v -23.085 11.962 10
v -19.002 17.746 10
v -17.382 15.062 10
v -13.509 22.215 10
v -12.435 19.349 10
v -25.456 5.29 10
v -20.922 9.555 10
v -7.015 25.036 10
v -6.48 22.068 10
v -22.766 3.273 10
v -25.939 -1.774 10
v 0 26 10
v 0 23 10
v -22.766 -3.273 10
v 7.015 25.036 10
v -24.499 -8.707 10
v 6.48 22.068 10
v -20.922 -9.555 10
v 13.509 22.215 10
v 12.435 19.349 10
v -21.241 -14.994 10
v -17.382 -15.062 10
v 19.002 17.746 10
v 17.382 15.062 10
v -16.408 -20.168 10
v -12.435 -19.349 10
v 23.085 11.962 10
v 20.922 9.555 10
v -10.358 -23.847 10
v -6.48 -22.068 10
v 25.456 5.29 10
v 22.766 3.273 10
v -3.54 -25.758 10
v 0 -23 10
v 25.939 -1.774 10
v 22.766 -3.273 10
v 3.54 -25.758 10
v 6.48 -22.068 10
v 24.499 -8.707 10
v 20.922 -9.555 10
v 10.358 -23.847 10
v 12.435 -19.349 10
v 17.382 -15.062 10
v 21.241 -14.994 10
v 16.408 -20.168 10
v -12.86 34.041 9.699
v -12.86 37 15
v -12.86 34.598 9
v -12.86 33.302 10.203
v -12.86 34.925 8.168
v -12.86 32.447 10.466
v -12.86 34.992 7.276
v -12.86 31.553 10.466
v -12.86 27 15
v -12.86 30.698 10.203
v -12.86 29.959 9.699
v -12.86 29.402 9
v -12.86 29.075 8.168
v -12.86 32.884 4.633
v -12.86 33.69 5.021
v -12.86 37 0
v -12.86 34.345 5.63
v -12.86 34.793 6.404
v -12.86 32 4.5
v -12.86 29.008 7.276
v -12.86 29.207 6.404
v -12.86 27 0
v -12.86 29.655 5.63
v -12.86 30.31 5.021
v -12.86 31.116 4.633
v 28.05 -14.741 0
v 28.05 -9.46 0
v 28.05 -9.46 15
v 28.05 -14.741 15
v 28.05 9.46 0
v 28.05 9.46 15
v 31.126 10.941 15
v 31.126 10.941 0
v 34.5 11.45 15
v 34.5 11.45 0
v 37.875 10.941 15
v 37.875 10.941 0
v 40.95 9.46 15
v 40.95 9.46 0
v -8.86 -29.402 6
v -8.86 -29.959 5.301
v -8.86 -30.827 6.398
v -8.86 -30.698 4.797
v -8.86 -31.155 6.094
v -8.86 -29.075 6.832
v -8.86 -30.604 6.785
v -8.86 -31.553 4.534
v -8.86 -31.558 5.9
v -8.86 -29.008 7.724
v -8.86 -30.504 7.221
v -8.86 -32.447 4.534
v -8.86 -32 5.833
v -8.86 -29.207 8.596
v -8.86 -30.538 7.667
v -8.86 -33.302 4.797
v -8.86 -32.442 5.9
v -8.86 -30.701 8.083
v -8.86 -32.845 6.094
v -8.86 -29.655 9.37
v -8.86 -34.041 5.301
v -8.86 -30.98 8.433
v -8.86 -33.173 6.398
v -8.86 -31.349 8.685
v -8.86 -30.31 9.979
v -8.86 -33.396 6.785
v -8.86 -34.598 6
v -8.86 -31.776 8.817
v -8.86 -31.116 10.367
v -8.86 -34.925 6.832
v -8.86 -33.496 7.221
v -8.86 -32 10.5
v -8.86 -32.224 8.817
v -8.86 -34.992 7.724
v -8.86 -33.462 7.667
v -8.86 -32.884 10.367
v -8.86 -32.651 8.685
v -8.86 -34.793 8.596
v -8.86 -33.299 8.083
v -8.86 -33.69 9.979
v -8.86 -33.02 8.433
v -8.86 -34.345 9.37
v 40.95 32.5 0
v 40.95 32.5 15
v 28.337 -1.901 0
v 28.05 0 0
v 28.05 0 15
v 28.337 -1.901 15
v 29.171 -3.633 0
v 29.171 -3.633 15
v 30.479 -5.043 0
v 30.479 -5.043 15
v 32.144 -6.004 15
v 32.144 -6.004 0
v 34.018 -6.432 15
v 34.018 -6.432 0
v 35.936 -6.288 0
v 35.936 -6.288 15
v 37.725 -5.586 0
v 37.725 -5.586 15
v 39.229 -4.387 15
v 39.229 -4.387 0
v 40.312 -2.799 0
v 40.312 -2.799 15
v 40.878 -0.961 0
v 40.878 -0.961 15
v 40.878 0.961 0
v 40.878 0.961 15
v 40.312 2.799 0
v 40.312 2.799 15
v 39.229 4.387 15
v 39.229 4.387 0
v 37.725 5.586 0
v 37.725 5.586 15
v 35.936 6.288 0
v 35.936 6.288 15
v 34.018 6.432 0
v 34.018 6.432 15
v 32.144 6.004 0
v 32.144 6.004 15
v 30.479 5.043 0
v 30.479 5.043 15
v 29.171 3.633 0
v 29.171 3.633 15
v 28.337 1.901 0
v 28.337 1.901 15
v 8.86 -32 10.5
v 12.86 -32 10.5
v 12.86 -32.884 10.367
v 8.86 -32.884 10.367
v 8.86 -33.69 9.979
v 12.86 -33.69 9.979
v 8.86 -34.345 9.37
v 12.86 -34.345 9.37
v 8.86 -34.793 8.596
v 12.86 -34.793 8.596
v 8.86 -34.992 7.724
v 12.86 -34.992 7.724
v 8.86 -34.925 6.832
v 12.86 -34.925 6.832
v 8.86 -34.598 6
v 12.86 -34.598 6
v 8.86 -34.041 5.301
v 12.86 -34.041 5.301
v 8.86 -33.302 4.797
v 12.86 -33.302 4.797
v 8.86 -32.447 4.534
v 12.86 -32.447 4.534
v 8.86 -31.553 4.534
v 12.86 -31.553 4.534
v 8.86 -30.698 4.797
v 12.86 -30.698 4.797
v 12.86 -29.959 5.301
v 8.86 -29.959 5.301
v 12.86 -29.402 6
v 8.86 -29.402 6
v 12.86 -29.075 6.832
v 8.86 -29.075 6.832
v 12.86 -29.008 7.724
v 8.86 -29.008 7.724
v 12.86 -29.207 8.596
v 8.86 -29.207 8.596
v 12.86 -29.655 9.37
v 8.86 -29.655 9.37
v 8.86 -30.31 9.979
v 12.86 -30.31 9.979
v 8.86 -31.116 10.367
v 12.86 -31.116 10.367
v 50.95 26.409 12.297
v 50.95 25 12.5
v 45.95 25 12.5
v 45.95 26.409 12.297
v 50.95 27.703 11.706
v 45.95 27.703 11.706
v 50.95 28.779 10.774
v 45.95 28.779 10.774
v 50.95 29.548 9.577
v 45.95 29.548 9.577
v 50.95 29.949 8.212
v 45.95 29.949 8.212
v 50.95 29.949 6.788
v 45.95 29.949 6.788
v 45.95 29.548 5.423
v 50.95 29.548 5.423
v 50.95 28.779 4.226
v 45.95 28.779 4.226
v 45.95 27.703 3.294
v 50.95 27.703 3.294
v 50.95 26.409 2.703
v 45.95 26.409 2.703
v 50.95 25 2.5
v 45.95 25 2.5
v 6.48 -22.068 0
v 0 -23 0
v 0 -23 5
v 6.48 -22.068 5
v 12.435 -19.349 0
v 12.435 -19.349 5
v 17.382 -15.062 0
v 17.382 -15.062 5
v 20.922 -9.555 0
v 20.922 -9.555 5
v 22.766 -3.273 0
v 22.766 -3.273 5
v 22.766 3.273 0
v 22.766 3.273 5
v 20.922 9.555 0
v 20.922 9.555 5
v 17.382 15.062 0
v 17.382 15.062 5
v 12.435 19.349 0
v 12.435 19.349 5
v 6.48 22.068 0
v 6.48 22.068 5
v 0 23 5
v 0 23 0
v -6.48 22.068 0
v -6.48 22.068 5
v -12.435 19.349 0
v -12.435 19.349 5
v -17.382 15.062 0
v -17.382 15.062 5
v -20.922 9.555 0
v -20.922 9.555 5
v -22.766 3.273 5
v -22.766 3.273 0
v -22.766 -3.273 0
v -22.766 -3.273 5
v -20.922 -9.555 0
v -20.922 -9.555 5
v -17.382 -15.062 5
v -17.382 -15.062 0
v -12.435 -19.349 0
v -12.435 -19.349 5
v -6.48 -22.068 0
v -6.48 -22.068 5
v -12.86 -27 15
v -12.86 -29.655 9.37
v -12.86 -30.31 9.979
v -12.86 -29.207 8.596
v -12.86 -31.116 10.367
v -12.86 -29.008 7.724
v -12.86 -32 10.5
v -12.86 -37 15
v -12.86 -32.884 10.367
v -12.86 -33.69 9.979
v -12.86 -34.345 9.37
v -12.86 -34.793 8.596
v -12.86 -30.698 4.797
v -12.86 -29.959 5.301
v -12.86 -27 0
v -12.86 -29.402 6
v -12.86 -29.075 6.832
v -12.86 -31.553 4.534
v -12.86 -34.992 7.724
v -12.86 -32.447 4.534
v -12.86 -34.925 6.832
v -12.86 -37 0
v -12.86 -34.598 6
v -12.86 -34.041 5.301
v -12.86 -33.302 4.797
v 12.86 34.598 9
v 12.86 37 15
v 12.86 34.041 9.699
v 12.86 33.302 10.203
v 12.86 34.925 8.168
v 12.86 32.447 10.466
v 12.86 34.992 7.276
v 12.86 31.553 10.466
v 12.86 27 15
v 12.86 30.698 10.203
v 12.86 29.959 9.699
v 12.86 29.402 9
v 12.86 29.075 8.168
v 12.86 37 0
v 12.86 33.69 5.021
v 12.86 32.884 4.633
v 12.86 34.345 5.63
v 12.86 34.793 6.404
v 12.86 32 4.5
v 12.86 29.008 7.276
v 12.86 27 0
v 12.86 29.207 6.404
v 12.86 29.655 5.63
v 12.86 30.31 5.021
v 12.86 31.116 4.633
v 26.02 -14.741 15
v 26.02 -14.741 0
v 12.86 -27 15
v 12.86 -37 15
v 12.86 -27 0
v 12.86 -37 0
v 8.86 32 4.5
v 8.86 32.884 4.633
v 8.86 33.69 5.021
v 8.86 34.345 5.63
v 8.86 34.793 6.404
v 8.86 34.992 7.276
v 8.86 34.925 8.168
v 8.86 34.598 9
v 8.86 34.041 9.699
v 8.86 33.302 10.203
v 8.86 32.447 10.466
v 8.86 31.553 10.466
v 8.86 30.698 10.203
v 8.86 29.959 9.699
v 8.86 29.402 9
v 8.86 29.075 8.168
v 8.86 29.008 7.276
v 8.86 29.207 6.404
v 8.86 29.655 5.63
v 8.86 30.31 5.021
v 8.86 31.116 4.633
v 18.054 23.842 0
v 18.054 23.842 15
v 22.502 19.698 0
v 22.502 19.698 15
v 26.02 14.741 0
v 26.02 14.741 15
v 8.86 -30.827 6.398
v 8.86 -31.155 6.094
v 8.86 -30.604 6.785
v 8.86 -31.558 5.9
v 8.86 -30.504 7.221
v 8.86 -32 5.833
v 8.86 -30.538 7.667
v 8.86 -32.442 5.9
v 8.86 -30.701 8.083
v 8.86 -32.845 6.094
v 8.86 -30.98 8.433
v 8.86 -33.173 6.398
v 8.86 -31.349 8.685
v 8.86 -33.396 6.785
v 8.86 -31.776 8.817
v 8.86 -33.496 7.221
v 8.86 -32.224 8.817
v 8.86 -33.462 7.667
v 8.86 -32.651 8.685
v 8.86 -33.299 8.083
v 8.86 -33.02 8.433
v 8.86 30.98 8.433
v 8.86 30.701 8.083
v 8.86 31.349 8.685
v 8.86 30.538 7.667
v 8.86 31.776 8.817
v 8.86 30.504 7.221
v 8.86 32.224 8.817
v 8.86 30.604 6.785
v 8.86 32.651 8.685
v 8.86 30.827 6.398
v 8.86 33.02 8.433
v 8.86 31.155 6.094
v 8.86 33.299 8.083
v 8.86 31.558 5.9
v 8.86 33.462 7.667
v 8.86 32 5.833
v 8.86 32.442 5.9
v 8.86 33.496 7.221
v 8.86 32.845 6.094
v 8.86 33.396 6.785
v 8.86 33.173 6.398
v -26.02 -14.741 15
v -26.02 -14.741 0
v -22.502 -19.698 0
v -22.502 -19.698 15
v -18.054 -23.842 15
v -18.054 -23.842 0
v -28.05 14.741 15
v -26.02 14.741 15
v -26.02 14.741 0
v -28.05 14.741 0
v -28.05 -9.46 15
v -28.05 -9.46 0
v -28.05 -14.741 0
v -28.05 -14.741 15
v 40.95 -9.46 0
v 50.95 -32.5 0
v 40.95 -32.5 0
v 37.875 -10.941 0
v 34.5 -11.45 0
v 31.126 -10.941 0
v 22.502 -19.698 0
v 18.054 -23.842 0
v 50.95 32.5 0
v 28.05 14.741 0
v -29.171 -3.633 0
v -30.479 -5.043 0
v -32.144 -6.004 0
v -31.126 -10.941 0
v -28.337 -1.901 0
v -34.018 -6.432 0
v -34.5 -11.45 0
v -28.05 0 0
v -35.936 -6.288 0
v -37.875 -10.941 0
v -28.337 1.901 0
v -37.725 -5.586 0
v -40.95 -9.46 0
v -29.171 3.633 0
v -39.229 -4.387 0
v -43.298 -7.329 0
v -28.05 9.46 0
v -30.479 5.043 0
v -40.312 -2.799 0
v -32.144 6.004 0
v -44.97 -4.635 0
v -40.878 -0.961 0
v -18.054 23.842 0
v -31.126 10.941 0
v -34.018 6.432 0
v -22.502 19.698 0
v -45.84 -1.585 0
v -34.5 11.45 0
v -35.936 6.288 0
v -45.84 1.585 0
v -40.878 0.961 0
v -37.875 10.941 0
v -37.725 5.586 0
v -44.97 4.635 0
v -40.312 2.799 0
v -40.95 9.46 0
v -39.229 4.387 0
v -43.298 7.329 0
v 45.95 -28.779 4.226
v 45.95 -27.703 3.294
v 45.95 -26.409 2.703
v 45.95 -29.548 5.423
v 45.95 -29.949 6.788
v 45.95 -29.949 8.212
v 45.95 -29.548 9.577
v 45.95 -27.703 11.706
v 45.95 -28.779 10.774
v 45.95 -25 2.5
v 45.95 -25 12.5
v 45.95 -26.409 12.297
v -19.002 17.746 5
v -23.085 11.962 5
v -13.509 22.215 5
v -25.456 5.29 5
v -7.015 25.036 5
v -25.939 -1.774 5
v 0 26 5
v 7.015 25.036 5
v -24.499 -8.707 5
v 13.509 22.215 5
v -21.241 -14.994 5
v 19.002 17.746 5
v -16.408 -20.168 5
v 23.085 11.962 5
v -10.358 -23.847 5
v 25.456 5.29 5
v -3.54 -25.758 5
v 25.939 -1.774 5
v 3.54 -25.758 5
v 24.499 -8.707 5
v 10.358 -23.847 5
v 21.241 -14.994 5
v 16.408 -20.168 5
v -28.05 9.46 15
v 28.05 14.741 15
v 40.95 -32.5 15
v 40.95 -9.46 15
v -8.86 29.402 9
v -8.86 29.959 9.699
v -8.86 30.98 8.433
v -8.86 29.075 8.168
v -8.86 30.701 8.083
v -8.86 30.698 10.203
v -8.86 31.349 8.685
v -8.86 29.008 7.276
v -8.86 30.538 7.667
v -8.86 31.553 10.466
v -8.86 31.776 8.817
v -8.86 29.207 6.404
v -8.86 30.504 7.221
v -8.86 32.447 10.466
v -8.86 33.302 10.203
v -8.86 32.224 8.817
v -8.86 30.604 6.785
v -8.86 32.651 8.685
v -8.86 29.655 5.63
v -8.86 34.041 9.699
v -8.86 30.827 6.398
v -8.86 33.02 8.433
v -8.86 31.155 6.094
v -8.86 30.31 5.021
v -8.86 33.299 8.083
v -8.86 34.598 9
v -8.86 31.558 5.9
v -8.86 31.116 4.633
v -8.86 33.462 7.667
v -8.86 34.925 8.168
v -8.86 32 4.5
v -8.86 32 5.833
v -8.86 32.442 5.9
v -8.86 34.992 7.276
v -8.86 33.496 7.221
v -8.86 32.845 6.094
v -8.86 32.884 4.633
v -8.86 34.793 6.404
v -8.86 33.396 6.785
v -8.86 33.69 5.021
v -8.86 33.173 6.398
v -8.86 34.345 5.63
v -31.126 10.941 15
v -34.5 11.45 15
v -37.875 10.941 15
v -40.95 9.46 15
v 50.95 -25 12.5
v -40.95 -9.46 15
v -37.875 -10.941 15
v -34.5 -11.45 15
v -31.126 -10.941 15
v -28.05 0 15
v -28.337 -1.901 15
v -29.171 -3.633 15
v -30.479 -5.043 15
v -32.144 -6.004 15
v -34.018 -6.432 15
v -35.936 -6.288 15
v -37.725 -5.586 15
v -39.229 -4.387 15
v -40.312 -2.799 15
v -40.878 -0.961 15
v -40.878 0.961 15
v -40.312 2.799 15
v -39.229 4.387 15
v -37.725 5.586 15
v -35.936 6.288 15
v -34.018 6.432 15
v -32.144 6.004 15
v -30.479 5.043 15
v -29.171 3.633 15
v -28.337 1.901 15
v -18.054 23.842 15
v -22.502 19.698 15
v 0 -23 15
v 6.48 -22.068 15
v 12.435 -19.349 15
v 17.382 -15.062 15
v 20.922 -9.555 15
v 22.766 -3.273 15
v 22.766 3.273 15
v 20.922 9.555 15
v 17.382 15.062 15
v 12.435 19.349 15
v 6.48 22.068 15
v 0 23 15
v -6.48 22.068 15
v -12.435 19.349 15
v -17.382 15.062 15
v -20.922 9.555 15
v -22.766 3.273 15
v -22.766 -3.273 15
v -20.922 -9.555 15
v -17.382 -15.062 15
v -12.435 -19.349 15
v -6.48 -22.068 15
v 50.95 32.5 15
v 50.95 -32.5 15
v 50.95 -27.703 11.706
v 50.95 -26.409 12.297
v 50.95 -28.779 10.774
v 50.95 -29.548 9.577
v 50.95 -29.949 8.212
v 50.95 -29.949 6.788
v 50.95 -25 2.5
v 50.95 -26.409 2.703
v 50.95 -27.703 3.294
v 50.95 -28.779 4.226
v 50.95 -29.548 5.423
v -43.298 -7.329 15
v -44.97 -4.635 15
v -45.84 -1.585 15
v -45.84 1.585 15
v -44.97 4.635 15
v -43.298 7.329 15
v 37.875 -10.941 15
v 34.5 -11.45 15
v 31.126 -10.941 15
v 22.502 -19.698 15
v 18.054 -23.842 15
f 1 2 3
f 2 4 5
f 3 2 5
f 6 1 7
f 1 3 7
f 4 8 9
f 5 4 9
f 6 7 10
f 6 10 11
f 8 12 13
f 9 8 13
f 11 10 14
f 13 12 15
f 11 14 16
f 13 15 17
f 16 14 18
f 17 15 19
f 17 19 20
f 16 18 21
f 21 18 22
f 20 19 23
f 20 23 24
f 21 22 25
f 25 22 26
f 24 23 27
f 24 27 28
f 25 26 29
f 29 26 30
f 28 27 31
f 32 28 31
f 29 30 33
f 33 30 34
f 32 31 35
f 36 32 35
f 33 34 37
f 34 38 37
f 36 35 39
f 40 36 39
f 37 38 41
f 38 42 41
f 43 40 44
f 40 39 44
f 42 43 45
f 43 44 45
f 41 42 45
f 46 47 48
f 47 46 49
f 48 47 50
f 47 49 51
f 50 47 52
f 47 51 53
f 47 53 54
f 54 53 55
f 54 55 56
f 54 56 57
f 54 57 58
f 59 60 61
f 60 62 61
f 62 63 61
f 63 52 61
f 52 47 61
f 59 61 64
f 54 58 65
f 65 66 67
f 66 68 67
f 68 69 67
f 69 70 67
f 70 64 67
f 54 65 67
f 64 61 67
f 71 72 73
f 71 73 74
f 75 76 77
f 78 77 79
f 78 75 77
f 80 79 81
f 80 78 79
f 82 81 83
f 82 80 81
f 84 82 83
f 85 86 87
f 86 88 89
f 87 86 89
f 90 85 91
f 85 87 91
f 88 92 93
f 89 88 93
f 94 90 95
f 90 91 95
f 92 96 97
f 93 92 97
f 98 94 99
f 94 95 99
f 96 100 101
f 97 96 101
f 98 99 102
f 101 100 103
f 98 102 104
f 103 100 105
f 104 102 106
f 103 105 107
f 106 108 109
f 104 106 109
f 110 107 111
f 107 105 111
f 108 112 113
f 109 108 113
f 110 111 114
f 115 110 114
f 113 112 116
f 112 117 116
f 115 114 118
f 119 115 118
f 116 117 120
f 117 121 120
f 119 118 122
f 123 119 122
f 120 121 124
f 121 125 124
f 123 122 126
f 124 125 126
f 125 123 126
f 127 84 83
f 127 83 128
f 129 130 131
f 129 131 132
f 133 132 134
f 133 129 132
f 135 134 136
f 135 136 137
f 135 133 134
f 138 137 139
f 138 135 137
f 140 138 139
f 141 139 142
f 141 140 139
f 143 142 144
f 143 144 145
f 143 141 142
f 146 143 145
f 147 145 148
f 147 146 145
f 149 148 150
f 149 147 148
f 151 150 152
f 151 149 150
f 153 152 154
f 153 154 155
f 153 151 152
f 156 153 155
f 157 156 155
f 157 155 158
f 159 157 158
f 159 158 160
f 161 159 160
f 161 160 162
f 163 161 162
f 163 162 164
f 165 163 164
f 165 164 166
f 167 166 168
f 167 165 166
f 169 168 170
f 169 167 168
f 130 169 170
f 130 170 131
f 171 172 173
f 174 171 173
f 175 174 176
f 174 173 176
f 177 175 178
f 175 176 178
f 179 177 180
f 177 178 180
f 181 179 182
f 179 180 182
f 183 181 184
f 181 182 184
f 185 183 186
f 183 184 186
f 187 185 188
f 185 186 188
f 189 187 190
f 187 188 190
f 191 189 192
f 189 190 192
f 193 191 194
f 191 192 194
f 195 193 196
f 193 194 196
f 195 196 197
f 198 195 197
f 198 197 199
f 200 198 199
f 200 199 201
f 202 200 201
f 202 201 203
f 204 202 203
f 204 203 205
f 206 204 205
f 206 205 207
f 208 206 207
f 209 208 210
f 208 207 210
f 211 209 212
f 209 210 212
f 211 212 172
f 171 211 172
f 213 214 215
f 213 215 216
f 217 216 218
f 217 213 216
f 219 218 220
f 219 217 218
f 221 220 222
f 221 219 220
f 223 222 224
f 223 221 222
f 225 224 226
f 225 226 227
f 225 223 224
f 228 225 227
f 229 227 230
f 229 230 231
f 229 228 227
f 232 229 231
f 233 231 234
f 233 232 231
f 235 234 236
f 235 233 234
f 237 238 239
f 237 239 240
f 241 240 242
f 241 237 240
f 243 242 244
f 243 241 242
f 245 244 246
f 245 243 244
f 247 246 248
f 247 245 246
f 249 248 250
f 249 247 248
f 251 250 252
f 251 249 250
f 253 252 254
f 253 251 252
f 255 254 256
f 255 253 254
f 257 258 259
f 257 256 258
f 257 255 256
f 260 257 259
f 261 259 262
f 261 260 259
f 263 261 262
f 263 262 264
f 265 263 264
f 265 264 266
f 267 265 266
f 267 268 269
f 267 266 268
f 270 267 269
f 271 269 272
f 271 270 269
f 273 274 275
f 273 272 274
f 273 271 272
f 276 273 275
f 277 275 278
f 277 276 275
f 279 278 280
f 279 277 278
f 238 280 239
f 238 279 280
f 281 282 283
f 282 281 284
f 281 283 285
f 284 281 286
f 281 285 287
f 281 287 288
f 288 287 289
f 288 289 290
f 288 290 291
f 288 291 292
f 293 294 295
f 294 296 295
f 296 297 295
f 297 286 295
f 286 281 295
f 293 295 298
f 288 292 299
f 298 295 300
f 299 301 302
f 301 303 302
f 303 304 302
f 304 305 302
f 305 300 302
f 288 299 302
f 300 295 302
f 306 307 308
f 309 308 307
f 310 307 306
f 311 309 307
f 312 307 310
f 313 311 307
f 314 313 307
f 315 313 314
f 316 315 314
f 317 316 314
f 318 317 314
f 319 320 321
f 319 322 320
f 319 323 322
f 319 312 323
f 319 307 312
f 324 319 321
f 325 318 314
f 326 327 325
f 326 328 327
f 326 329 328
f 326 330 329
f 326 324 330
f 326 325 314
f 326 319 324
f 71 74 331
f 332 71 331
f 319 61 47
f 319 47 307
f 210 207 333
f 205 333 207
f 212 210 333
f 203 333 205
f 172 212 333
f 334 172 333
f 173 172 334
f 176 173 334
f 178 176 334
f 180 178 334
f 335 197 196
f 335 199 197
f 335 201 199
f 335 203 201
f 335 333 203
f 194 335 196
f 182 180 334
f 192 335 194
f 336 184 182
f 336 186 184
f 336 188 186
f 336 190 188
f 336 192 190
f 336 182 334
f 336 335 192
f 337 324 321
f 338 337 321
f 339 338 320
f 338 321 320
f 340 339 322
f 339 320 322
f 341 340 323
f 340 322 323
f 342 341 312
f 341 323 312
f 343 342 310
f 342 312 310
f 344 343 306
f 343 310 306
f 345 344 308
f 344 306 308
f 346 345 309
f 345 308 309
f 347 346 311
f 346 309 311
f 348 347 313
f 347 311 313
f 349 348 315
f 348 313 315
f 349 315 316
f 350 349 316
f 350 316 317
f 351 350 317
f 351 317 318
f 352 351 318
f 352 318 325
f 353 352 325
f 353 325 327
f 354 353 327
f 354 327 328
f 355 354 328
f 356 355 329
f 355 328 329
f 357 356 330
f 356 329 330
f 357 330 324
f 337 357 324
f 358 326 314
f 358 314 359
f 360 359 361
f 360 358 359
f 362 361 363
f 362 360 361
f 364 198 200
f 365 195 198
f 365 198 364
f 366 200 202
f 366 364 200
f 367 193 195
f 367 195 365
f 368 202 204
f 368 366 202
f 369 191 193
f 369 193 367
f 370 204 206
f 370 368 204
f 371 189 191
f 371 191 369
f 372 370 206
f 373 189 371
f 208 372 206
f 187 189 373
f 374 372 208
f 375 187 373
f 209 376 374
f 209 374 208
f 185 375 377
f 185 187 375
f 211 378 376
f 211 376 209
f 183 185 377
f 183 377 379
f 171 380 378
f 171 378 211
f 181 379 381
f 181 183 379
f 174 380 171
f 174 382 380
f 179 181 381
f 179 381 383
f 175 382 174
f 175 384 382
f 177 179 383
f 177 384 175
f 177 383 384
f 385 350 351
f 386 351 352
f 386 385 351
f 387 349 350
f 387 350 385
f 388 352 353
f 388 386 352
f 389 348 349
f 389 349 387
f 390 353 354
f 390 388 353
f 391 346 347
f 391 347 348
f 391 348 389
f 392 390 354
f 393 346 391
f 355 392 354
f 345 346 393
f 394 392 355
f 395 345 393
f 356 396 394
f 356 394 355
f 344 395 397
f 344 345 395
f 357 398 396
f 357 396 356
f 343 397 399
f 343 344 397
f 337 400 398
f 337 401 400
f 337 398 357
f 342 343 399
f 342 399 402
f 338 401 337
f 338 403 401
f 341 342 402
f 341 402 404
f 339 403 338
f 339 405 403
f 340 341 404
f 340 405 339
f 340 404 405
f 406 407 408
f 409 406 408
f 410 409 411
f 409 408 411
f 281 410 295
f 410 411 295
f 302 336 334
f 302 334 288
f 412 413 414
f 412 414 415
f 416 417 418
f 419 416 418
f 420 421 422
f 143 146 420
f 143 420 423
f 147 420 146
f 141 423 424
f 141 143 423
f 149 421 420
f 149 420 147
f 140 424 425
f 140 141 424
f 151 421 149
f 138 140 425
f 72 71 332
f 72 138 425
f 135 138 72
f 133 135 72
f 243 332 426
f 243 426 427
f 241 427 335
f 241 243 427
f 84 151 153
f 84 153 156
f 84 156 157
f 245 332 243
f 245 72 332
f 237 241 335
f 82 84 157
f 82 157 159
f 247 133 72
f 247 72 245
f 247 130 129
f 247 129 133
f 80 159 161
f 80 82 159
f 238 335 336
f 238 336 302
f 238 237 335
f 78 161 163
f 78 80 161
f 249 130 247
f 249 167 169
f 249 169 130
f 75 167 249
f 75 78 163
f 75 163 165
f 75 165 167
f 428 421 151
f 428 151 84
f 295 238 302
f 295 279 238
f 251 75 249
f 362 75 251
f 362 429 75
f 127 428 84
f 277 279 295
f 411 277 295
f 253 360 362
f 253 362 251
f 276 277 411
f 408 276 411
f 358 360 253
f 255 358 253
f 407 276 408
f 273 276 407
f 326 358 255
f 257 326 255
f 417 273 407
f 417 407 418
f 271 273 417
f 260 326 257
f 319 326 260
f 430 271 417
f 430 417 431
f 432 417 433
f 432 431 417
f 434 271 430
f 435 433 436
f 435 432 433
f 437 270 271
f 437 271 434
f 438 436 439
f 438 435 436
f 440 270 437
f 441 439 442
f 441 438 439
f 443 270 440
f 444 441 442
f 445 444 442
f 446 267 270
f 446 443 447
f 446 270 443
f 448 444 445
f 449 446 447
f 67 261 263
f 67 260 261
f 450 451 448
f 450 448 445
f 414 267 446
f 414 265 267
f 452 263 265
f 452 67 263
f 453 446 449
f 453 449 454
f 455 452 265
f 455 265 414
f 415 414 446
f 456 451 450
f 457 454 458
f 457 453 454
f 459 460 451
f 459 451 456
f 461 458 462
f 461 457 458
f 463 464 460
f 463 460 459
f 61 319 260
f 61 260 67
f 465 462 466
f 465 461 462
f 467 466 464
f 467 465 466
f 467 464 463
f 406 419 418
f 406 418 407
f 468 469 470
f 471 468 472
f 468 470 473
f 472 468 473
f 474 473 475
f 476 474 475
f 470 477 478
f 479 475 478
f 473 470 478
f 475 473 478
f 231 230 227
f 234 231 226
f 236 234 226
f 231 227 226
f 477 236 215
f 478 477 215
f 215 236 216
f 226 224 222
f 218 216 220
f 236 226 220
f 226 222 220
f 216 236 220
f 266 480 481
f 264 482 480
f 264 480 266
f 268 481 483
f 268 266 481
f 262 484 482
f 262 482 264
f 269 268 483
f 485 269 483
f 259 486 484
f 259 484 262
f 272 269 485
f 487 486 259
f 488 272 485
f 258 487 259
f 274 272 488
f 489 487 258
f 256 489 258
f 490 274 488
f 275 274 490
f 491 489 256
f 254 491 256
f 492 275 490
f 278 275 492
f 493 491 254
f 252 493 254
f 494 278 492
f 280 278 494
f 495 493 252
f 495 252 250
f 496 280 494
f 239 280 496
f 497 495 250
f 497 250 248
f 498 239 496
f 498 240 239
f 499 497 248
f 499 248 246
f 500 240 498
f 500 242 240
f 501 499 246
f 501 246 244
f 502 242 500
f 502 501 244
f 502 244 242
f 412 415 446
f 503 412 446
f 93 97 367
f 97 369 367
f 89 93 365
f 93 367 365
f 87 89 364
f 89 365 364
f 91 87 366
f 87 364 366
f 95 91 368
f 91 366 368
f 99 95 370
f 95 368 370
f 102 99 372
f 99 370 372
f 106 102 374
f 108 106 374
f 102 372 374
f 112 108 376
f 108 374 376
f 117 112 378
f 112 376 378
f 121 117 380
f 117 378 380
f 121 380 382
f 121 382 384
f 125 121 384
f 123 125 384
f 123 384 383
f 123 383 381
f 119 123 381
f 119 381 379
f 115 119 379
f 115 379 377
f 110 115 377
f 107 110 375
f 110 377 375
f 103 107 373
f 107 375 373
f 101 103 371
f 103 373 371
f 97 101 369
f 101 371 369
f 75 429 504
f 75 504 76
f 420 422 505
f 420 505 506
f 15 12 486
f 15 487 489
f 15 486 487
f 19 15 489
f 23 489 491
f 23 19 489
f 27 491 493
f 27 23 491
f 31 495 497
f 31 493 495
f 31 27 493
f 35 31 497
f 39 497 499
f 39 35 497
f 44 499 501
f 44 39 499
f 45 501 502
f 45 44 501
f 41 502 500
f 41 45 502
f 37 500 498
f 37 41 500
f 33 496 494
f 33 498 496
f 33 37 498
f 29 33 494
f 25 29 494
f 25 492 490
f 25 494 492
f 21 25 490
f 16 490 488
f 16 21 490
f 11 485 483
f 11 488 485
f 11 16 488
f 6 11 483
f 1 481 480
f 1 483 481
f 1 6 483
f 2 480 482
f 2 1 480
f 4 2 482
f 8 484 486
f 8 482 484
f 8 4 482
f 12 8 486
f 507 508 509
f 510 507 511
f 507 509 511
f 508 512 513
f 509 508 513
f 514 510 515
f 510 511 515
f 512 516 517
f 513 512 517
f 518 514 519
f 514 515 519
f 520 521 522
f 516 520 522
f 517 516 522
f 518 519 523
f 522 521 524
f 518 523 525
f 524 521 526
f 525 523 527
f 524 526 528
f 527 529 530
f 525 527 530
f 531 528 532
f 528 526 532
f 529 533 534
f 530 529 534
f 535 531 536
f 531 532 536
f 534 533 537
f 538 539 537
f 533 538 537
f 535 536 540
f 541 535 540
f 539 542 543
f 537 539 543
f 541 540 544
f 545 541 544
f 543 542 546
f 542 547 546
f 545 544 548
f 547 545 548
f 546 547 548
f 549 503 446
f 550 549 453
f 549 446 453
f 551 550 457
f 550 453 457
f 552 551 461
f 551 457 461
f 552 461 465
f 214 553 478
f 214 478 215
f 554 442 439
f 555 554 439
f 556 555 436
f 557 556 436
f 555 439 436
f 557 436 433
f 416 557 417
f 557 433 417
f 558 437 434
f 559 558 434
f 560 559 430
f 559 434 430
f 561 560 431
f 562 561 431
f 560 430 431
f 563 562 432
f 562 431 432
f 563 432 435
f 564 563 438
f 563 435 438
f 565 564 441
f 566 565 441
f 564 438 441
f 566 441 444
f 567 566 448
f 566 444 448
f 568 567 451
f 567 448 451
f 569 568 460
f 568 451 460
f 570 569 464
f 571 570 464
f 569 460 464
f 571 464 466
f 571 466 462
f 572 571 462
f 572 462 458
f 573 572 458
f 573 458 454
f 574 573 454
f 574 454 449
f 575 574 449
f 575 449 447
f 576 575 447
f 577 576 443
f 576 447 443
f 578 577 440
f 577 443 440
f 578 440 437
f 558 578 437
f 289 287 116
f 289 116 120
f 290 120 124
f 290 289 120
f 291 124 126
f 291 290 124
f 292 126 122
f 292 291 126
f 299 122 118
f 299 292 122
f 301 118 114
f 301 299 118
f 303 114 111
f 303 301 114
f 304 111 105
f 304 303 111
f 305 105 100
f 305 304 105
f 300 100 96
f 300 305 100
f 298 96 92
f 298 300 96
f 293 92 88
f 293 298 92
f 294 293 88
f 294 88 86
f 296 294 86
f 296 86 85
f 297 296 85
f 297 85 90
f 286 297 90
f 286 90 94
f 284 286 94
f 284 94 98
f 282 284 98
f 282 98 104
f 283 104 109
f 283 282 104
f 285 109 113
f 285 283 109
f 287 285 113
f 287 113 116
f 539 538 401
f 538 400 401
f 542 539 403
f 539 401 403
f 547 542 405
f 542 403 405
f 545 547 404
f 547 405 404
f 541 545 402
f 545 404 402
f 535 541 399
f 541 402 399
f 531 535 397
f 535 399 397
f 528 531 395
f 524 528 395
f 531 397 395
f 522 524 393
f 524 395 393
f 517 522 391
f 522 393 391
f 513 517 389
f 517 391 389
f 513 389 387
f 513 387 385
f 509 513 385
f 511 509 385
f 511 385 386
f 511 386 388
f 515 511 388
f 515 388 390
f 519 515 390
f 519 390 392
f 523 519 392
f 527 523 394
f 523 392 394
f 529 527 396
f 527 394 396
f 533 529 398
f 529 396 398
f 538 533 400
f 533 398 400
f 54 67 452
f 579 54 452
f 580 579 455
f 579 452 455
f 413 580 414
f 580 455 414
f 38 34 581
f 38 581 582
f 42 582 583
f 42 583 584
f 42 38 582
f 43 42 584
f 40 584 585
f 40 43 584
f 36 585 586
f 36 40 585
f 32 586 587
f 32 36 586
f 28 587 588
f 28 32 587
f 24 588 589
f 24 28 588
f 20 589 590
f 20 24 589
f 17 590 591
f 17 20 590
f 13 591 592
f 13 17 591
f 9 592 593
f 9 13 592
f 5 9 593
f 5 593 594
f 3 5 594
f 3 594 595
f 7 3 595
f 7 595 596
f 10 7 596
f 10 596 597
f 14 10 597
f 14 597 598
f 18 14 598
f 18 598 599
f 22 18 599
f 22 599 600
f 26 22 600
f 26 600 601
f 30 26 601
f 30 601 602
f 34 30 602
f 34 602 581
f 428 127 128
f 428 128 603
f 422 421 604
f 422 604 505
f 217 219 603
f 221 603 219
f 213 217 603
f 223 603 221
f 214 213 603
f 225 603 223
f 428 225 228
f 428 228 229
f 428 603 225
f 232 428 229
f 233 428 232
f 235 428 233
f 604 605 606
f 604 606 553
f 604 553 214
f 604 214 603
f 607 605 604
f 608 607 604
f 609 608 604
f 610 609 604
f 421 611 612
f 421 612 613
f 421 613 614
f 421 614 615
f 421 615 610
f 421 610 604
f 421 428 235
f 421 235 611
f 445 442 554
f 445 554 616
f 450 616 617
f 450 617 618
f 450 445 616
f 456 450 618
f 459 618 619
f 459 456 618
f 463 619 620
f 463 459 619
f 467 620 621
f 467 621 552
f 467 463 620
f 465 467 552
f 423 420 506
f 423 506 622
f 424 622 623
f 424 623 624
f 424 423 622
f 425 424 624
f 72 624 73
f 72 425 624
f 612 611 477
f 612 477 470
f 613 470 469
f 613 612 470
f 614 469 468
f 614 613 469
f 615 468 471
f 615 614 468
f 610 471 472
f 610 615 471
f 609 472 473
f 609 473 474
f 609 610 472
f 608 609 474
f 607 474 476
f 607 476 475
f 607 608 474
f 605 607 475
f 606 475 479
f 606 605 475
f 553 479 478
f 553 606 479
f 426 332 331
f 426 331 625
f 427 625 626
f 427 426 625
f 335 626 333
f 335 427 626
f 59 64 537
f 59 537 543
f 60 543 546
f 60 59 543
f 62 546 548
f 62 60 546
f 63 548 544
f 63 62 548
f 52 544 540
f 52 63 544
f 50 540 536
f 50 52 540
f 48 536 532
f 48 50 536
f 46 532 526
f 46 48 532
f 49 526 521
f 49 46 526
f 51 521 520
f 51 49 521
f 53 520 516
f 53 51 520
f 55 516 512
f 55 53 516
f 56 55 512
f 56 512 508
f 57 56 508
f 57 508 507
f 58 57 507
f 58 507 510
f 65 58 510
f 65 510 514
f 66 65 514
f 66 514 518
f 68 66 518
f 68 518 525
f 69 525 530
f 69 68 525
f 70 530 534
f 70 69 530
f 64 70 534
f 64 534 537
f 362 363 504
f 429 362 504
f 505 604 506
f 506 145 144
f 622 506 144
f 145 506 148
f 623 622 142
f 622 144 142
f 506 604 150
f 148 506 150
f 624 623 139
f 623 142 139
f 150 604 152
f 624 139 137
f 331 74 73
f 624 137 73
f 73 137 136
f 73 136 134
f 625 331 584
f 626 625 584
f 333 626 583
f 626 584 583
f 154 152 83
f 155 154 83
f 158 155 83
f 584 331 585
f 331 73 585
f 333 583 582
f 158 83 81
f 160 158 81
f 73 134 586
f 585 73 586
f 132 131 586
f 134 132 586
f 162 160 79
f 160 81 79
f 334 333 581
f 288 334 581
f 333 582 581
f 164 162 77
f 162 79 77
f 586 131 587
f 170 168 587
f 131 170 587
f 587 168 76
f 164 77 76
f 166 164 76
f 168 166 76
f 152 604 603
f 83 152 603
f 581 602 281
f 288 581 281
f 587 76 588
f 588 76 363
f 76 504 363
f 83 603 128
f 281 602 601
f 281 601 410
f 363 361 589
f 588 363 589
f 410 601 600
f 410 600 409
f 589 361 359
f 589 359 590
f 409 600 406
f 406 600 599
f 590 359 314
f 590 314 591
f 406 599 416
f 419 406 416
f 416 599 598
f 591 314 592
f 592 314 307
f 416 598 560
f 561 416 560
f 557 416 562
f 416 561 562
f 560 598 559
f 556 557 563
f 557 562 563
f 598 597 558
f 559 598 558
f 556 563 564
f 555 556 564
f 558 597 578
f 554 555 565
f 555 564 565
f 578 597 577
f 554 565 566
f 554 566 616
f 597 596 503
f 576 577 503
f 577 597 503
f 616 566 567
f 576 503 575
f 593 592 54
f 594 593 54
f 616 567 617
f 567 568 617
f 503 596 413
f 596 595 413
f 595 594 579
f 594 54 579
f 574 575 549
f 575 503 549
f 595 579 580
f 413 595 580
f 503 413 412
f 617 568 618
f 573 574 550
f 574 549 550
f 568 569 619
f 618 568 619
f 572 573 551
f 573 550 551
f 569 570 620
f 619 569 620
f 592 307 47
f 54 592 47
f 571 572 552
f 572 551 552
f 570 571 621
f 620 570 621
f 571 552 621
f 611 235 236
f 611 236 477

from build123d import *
from build123d.topology import SkipClean

# Parameters (mm, degrees)
SKETCH1_R           = 6.45
BOSS_EXTRUDE1_DEPTH = 15
SKETCH2_W           = 5
SKETCH2_H           = 3
CUT_EXTRUDE3_DEPTH  = 5
CUT_EXTRUDE4_START  = -40
SKETCH4_R           = 1.5
CUT_EXTRUDE4_DEPTH  = 63
SKETCH5_R           = 3
CUT_EXTRUDE5_DEPTH  = 4
CUT_EXTRUDE6_START  = -80
CUT_EXTRUDE6_DEPTH  = 80


with BuildPart() as part:
    # Sketch1 → Boss-Extrude1 (new body)
    with BuildSketch(Plane.XY):
        with BuildLine():
            Line((0, 23), (0, 37))
            Line((0, 37), (12.859510911, 37))
            Line((12.859510911, 37), (12.859510911, 27))
            ThreePointArc((12.859510911, 27), (20.383390121, 21.88342816), (26.020458433, 14.741192754))
            Line((26.020458433, 14.741192754), (28.050458433, 14.741192754))
            Line((28.050458433, 14.741192754), (28.050458433, 9.460443964))
            ThreePointArc((28.050458433, 9.460443964), (34.500458433, 11.45), (40.950458433, 9.460443964))
            Line((40.950458433, 9.460443964), (40.950458433, 32.5))
            Line((40.950458433, 32.5), (50.950458433, 32.5))
            Line((50.950458433, 32.5), (50.950458433, -32.5))
            Line((50.950458433, -32.5), (40.950458433, -32.5))
            Line((40.950458433, -32.5), (40.950458433, -9.460443964))
            ThreePointArc((40.950458433, -9.460443964), (34.500458433, -11.45), (28.050458433, -9.460443964))
            Line((28.050458433, -9.460443964), (28.050458433, -14.741192754))
            Line((28.050458433, -14.741192754), (26.020458433, -14.741192754))
            ThreePointArc((26.020458433, -14.741192754), (20.383390121, -21.88342816), (12.859510911, -27))
            Line((12.859510911, -27), (12.859510911, -37))
            Line((12.859510911, -37), (0, -37))
            Line((0, -37), (0, -23))
            ThreePointArc((0, -23), (23, 0), (0, 23))
        make_face()
        with Locations(Location((34.500458433, 0, 0), (0, 0, 180))):
            Circle(SKETCH1_R, mode=Mode.SUBTRACT)
    boss_extrude1 = extrude(amount=BOSS_EXTRUDE1_DEPTH)

    # Sketch2 → Cut-Revolve1 (revolve, cut)
    with BuildSketch(Plane.ZY):
        with Locations((7.5, 24.5)):
            Rectangle(SKETCH2_W, SKETCH2_H)
    cut_revolve1 = revolve(axis=Axis((0, 0, 15), (0, 0, -1)), mode=Mode.SUBTRACT)

    # Sketch3 → Cut-Extrude3 (cut)
    with BuildSketch(Plane(origin=(50.950458433, 0, 0), x_dir=(0, 0, -1), z_dir=(1, 0, 0))):
        with BuildLine():
            Line((-12.5, -25), (-12.5, 25))
            ThreePointArc((-12.5, 25), (-7.5, 30), (-2.5, 25))
            Line((-2.5, 25), (-2.5, -25))
            ThreePointArc((-2.5, -25), (-7.5, -30), (-12.5, -25))
        make_face()
    extrude(amount=-CUT_EXTRUDE3_DEPTH, mode=Mode.SUBTRACT)

    # Sketch4 → Cut-Extrude4 (cut)
    with BuildSketch(Plane(origin=(12.859510911, 0, 0), x_dir=(0, 0, -1), z_dir=(1, 0, 0)).offset(CUT_EXTRUDE4_START)):
        with Locations((-7.333431897, 32)):
            Circle(SKETCH4_R)
        with Locations((-7.333431897, -32)):
            Circle(SKETCH4_R)
    cut_extrude4 = extrude(amount=CUT_EXTRUDE4_DEPTH, mode=Mode.SUBTRACT)

    # Sketch5 → Cut-Extrude5 (cut)
    with BuildSketch(Plane(origin=(12.859510911, 0, 0), x_dir=(0, 0, -1), z_dir=(1, 0, 0))):
        with Locations((-7.5, 32)):
            Circle(SKETCH5_R)
        with Locations(Location((-7.5, -32, 0), (0, 0, 180))):
            Circle(SKETCH5_R)
    cut_extrude5 = extrude(amount=-CUT_EXTRUDE5_DEPTH, mode=Mode.SUBTRACT)

    # Mirror1: Boss-Extrude1, Cut-Revolve1, Cut-Extrude4, Cut-Extrude5 across plane
    add(boss_extrude1.mirror(Plane.ZY))
    add(cut_revolve1.mirror(Plane.ZY), mode=Mode.SUBTRACT)
    add(cut_extrude4.mirror(Plane.ZY), mode=Mode.SUBTRACT)
    add(cut_extrude5.mirror(Plane.ZY), mode=Mode.SUBTRACT)

    # Sketch6 → Cut-Extrude6 (cut)
    with SkipClean():  # the faces are left unmerged after this step: merging them gives an invalid solid
        with BuildSketch(Plane.XY.offset(15).offset(CUT_EXTRUDE6_START)):
            with BuildLine():
                Line((-40.950458433, 9.460443964), (-40.950458433, 38.741811421))
                Line((-40.950458433, 38.741811421), (-62.772471418, 38.741811421))
                Line((-62.772471418, 38.741811421), (-62.772471418, -39.471412389))
                Line((-62.772471418, -39.471412389), (-40.950458433, -39.471412389))
                Line((-40.950458433, -39.471412389), (-40.950458433, -9.460443964))
                ThreePointArc((-40.950458433, -9.460443964), (-45.950458433, 0), (-40.950458433, 9.460443964))
            make_face()
        extrude(amount=CUT_EXTRUDE6_DEPTH, mode=Mode.SUBTRACT)


solid = part.part
